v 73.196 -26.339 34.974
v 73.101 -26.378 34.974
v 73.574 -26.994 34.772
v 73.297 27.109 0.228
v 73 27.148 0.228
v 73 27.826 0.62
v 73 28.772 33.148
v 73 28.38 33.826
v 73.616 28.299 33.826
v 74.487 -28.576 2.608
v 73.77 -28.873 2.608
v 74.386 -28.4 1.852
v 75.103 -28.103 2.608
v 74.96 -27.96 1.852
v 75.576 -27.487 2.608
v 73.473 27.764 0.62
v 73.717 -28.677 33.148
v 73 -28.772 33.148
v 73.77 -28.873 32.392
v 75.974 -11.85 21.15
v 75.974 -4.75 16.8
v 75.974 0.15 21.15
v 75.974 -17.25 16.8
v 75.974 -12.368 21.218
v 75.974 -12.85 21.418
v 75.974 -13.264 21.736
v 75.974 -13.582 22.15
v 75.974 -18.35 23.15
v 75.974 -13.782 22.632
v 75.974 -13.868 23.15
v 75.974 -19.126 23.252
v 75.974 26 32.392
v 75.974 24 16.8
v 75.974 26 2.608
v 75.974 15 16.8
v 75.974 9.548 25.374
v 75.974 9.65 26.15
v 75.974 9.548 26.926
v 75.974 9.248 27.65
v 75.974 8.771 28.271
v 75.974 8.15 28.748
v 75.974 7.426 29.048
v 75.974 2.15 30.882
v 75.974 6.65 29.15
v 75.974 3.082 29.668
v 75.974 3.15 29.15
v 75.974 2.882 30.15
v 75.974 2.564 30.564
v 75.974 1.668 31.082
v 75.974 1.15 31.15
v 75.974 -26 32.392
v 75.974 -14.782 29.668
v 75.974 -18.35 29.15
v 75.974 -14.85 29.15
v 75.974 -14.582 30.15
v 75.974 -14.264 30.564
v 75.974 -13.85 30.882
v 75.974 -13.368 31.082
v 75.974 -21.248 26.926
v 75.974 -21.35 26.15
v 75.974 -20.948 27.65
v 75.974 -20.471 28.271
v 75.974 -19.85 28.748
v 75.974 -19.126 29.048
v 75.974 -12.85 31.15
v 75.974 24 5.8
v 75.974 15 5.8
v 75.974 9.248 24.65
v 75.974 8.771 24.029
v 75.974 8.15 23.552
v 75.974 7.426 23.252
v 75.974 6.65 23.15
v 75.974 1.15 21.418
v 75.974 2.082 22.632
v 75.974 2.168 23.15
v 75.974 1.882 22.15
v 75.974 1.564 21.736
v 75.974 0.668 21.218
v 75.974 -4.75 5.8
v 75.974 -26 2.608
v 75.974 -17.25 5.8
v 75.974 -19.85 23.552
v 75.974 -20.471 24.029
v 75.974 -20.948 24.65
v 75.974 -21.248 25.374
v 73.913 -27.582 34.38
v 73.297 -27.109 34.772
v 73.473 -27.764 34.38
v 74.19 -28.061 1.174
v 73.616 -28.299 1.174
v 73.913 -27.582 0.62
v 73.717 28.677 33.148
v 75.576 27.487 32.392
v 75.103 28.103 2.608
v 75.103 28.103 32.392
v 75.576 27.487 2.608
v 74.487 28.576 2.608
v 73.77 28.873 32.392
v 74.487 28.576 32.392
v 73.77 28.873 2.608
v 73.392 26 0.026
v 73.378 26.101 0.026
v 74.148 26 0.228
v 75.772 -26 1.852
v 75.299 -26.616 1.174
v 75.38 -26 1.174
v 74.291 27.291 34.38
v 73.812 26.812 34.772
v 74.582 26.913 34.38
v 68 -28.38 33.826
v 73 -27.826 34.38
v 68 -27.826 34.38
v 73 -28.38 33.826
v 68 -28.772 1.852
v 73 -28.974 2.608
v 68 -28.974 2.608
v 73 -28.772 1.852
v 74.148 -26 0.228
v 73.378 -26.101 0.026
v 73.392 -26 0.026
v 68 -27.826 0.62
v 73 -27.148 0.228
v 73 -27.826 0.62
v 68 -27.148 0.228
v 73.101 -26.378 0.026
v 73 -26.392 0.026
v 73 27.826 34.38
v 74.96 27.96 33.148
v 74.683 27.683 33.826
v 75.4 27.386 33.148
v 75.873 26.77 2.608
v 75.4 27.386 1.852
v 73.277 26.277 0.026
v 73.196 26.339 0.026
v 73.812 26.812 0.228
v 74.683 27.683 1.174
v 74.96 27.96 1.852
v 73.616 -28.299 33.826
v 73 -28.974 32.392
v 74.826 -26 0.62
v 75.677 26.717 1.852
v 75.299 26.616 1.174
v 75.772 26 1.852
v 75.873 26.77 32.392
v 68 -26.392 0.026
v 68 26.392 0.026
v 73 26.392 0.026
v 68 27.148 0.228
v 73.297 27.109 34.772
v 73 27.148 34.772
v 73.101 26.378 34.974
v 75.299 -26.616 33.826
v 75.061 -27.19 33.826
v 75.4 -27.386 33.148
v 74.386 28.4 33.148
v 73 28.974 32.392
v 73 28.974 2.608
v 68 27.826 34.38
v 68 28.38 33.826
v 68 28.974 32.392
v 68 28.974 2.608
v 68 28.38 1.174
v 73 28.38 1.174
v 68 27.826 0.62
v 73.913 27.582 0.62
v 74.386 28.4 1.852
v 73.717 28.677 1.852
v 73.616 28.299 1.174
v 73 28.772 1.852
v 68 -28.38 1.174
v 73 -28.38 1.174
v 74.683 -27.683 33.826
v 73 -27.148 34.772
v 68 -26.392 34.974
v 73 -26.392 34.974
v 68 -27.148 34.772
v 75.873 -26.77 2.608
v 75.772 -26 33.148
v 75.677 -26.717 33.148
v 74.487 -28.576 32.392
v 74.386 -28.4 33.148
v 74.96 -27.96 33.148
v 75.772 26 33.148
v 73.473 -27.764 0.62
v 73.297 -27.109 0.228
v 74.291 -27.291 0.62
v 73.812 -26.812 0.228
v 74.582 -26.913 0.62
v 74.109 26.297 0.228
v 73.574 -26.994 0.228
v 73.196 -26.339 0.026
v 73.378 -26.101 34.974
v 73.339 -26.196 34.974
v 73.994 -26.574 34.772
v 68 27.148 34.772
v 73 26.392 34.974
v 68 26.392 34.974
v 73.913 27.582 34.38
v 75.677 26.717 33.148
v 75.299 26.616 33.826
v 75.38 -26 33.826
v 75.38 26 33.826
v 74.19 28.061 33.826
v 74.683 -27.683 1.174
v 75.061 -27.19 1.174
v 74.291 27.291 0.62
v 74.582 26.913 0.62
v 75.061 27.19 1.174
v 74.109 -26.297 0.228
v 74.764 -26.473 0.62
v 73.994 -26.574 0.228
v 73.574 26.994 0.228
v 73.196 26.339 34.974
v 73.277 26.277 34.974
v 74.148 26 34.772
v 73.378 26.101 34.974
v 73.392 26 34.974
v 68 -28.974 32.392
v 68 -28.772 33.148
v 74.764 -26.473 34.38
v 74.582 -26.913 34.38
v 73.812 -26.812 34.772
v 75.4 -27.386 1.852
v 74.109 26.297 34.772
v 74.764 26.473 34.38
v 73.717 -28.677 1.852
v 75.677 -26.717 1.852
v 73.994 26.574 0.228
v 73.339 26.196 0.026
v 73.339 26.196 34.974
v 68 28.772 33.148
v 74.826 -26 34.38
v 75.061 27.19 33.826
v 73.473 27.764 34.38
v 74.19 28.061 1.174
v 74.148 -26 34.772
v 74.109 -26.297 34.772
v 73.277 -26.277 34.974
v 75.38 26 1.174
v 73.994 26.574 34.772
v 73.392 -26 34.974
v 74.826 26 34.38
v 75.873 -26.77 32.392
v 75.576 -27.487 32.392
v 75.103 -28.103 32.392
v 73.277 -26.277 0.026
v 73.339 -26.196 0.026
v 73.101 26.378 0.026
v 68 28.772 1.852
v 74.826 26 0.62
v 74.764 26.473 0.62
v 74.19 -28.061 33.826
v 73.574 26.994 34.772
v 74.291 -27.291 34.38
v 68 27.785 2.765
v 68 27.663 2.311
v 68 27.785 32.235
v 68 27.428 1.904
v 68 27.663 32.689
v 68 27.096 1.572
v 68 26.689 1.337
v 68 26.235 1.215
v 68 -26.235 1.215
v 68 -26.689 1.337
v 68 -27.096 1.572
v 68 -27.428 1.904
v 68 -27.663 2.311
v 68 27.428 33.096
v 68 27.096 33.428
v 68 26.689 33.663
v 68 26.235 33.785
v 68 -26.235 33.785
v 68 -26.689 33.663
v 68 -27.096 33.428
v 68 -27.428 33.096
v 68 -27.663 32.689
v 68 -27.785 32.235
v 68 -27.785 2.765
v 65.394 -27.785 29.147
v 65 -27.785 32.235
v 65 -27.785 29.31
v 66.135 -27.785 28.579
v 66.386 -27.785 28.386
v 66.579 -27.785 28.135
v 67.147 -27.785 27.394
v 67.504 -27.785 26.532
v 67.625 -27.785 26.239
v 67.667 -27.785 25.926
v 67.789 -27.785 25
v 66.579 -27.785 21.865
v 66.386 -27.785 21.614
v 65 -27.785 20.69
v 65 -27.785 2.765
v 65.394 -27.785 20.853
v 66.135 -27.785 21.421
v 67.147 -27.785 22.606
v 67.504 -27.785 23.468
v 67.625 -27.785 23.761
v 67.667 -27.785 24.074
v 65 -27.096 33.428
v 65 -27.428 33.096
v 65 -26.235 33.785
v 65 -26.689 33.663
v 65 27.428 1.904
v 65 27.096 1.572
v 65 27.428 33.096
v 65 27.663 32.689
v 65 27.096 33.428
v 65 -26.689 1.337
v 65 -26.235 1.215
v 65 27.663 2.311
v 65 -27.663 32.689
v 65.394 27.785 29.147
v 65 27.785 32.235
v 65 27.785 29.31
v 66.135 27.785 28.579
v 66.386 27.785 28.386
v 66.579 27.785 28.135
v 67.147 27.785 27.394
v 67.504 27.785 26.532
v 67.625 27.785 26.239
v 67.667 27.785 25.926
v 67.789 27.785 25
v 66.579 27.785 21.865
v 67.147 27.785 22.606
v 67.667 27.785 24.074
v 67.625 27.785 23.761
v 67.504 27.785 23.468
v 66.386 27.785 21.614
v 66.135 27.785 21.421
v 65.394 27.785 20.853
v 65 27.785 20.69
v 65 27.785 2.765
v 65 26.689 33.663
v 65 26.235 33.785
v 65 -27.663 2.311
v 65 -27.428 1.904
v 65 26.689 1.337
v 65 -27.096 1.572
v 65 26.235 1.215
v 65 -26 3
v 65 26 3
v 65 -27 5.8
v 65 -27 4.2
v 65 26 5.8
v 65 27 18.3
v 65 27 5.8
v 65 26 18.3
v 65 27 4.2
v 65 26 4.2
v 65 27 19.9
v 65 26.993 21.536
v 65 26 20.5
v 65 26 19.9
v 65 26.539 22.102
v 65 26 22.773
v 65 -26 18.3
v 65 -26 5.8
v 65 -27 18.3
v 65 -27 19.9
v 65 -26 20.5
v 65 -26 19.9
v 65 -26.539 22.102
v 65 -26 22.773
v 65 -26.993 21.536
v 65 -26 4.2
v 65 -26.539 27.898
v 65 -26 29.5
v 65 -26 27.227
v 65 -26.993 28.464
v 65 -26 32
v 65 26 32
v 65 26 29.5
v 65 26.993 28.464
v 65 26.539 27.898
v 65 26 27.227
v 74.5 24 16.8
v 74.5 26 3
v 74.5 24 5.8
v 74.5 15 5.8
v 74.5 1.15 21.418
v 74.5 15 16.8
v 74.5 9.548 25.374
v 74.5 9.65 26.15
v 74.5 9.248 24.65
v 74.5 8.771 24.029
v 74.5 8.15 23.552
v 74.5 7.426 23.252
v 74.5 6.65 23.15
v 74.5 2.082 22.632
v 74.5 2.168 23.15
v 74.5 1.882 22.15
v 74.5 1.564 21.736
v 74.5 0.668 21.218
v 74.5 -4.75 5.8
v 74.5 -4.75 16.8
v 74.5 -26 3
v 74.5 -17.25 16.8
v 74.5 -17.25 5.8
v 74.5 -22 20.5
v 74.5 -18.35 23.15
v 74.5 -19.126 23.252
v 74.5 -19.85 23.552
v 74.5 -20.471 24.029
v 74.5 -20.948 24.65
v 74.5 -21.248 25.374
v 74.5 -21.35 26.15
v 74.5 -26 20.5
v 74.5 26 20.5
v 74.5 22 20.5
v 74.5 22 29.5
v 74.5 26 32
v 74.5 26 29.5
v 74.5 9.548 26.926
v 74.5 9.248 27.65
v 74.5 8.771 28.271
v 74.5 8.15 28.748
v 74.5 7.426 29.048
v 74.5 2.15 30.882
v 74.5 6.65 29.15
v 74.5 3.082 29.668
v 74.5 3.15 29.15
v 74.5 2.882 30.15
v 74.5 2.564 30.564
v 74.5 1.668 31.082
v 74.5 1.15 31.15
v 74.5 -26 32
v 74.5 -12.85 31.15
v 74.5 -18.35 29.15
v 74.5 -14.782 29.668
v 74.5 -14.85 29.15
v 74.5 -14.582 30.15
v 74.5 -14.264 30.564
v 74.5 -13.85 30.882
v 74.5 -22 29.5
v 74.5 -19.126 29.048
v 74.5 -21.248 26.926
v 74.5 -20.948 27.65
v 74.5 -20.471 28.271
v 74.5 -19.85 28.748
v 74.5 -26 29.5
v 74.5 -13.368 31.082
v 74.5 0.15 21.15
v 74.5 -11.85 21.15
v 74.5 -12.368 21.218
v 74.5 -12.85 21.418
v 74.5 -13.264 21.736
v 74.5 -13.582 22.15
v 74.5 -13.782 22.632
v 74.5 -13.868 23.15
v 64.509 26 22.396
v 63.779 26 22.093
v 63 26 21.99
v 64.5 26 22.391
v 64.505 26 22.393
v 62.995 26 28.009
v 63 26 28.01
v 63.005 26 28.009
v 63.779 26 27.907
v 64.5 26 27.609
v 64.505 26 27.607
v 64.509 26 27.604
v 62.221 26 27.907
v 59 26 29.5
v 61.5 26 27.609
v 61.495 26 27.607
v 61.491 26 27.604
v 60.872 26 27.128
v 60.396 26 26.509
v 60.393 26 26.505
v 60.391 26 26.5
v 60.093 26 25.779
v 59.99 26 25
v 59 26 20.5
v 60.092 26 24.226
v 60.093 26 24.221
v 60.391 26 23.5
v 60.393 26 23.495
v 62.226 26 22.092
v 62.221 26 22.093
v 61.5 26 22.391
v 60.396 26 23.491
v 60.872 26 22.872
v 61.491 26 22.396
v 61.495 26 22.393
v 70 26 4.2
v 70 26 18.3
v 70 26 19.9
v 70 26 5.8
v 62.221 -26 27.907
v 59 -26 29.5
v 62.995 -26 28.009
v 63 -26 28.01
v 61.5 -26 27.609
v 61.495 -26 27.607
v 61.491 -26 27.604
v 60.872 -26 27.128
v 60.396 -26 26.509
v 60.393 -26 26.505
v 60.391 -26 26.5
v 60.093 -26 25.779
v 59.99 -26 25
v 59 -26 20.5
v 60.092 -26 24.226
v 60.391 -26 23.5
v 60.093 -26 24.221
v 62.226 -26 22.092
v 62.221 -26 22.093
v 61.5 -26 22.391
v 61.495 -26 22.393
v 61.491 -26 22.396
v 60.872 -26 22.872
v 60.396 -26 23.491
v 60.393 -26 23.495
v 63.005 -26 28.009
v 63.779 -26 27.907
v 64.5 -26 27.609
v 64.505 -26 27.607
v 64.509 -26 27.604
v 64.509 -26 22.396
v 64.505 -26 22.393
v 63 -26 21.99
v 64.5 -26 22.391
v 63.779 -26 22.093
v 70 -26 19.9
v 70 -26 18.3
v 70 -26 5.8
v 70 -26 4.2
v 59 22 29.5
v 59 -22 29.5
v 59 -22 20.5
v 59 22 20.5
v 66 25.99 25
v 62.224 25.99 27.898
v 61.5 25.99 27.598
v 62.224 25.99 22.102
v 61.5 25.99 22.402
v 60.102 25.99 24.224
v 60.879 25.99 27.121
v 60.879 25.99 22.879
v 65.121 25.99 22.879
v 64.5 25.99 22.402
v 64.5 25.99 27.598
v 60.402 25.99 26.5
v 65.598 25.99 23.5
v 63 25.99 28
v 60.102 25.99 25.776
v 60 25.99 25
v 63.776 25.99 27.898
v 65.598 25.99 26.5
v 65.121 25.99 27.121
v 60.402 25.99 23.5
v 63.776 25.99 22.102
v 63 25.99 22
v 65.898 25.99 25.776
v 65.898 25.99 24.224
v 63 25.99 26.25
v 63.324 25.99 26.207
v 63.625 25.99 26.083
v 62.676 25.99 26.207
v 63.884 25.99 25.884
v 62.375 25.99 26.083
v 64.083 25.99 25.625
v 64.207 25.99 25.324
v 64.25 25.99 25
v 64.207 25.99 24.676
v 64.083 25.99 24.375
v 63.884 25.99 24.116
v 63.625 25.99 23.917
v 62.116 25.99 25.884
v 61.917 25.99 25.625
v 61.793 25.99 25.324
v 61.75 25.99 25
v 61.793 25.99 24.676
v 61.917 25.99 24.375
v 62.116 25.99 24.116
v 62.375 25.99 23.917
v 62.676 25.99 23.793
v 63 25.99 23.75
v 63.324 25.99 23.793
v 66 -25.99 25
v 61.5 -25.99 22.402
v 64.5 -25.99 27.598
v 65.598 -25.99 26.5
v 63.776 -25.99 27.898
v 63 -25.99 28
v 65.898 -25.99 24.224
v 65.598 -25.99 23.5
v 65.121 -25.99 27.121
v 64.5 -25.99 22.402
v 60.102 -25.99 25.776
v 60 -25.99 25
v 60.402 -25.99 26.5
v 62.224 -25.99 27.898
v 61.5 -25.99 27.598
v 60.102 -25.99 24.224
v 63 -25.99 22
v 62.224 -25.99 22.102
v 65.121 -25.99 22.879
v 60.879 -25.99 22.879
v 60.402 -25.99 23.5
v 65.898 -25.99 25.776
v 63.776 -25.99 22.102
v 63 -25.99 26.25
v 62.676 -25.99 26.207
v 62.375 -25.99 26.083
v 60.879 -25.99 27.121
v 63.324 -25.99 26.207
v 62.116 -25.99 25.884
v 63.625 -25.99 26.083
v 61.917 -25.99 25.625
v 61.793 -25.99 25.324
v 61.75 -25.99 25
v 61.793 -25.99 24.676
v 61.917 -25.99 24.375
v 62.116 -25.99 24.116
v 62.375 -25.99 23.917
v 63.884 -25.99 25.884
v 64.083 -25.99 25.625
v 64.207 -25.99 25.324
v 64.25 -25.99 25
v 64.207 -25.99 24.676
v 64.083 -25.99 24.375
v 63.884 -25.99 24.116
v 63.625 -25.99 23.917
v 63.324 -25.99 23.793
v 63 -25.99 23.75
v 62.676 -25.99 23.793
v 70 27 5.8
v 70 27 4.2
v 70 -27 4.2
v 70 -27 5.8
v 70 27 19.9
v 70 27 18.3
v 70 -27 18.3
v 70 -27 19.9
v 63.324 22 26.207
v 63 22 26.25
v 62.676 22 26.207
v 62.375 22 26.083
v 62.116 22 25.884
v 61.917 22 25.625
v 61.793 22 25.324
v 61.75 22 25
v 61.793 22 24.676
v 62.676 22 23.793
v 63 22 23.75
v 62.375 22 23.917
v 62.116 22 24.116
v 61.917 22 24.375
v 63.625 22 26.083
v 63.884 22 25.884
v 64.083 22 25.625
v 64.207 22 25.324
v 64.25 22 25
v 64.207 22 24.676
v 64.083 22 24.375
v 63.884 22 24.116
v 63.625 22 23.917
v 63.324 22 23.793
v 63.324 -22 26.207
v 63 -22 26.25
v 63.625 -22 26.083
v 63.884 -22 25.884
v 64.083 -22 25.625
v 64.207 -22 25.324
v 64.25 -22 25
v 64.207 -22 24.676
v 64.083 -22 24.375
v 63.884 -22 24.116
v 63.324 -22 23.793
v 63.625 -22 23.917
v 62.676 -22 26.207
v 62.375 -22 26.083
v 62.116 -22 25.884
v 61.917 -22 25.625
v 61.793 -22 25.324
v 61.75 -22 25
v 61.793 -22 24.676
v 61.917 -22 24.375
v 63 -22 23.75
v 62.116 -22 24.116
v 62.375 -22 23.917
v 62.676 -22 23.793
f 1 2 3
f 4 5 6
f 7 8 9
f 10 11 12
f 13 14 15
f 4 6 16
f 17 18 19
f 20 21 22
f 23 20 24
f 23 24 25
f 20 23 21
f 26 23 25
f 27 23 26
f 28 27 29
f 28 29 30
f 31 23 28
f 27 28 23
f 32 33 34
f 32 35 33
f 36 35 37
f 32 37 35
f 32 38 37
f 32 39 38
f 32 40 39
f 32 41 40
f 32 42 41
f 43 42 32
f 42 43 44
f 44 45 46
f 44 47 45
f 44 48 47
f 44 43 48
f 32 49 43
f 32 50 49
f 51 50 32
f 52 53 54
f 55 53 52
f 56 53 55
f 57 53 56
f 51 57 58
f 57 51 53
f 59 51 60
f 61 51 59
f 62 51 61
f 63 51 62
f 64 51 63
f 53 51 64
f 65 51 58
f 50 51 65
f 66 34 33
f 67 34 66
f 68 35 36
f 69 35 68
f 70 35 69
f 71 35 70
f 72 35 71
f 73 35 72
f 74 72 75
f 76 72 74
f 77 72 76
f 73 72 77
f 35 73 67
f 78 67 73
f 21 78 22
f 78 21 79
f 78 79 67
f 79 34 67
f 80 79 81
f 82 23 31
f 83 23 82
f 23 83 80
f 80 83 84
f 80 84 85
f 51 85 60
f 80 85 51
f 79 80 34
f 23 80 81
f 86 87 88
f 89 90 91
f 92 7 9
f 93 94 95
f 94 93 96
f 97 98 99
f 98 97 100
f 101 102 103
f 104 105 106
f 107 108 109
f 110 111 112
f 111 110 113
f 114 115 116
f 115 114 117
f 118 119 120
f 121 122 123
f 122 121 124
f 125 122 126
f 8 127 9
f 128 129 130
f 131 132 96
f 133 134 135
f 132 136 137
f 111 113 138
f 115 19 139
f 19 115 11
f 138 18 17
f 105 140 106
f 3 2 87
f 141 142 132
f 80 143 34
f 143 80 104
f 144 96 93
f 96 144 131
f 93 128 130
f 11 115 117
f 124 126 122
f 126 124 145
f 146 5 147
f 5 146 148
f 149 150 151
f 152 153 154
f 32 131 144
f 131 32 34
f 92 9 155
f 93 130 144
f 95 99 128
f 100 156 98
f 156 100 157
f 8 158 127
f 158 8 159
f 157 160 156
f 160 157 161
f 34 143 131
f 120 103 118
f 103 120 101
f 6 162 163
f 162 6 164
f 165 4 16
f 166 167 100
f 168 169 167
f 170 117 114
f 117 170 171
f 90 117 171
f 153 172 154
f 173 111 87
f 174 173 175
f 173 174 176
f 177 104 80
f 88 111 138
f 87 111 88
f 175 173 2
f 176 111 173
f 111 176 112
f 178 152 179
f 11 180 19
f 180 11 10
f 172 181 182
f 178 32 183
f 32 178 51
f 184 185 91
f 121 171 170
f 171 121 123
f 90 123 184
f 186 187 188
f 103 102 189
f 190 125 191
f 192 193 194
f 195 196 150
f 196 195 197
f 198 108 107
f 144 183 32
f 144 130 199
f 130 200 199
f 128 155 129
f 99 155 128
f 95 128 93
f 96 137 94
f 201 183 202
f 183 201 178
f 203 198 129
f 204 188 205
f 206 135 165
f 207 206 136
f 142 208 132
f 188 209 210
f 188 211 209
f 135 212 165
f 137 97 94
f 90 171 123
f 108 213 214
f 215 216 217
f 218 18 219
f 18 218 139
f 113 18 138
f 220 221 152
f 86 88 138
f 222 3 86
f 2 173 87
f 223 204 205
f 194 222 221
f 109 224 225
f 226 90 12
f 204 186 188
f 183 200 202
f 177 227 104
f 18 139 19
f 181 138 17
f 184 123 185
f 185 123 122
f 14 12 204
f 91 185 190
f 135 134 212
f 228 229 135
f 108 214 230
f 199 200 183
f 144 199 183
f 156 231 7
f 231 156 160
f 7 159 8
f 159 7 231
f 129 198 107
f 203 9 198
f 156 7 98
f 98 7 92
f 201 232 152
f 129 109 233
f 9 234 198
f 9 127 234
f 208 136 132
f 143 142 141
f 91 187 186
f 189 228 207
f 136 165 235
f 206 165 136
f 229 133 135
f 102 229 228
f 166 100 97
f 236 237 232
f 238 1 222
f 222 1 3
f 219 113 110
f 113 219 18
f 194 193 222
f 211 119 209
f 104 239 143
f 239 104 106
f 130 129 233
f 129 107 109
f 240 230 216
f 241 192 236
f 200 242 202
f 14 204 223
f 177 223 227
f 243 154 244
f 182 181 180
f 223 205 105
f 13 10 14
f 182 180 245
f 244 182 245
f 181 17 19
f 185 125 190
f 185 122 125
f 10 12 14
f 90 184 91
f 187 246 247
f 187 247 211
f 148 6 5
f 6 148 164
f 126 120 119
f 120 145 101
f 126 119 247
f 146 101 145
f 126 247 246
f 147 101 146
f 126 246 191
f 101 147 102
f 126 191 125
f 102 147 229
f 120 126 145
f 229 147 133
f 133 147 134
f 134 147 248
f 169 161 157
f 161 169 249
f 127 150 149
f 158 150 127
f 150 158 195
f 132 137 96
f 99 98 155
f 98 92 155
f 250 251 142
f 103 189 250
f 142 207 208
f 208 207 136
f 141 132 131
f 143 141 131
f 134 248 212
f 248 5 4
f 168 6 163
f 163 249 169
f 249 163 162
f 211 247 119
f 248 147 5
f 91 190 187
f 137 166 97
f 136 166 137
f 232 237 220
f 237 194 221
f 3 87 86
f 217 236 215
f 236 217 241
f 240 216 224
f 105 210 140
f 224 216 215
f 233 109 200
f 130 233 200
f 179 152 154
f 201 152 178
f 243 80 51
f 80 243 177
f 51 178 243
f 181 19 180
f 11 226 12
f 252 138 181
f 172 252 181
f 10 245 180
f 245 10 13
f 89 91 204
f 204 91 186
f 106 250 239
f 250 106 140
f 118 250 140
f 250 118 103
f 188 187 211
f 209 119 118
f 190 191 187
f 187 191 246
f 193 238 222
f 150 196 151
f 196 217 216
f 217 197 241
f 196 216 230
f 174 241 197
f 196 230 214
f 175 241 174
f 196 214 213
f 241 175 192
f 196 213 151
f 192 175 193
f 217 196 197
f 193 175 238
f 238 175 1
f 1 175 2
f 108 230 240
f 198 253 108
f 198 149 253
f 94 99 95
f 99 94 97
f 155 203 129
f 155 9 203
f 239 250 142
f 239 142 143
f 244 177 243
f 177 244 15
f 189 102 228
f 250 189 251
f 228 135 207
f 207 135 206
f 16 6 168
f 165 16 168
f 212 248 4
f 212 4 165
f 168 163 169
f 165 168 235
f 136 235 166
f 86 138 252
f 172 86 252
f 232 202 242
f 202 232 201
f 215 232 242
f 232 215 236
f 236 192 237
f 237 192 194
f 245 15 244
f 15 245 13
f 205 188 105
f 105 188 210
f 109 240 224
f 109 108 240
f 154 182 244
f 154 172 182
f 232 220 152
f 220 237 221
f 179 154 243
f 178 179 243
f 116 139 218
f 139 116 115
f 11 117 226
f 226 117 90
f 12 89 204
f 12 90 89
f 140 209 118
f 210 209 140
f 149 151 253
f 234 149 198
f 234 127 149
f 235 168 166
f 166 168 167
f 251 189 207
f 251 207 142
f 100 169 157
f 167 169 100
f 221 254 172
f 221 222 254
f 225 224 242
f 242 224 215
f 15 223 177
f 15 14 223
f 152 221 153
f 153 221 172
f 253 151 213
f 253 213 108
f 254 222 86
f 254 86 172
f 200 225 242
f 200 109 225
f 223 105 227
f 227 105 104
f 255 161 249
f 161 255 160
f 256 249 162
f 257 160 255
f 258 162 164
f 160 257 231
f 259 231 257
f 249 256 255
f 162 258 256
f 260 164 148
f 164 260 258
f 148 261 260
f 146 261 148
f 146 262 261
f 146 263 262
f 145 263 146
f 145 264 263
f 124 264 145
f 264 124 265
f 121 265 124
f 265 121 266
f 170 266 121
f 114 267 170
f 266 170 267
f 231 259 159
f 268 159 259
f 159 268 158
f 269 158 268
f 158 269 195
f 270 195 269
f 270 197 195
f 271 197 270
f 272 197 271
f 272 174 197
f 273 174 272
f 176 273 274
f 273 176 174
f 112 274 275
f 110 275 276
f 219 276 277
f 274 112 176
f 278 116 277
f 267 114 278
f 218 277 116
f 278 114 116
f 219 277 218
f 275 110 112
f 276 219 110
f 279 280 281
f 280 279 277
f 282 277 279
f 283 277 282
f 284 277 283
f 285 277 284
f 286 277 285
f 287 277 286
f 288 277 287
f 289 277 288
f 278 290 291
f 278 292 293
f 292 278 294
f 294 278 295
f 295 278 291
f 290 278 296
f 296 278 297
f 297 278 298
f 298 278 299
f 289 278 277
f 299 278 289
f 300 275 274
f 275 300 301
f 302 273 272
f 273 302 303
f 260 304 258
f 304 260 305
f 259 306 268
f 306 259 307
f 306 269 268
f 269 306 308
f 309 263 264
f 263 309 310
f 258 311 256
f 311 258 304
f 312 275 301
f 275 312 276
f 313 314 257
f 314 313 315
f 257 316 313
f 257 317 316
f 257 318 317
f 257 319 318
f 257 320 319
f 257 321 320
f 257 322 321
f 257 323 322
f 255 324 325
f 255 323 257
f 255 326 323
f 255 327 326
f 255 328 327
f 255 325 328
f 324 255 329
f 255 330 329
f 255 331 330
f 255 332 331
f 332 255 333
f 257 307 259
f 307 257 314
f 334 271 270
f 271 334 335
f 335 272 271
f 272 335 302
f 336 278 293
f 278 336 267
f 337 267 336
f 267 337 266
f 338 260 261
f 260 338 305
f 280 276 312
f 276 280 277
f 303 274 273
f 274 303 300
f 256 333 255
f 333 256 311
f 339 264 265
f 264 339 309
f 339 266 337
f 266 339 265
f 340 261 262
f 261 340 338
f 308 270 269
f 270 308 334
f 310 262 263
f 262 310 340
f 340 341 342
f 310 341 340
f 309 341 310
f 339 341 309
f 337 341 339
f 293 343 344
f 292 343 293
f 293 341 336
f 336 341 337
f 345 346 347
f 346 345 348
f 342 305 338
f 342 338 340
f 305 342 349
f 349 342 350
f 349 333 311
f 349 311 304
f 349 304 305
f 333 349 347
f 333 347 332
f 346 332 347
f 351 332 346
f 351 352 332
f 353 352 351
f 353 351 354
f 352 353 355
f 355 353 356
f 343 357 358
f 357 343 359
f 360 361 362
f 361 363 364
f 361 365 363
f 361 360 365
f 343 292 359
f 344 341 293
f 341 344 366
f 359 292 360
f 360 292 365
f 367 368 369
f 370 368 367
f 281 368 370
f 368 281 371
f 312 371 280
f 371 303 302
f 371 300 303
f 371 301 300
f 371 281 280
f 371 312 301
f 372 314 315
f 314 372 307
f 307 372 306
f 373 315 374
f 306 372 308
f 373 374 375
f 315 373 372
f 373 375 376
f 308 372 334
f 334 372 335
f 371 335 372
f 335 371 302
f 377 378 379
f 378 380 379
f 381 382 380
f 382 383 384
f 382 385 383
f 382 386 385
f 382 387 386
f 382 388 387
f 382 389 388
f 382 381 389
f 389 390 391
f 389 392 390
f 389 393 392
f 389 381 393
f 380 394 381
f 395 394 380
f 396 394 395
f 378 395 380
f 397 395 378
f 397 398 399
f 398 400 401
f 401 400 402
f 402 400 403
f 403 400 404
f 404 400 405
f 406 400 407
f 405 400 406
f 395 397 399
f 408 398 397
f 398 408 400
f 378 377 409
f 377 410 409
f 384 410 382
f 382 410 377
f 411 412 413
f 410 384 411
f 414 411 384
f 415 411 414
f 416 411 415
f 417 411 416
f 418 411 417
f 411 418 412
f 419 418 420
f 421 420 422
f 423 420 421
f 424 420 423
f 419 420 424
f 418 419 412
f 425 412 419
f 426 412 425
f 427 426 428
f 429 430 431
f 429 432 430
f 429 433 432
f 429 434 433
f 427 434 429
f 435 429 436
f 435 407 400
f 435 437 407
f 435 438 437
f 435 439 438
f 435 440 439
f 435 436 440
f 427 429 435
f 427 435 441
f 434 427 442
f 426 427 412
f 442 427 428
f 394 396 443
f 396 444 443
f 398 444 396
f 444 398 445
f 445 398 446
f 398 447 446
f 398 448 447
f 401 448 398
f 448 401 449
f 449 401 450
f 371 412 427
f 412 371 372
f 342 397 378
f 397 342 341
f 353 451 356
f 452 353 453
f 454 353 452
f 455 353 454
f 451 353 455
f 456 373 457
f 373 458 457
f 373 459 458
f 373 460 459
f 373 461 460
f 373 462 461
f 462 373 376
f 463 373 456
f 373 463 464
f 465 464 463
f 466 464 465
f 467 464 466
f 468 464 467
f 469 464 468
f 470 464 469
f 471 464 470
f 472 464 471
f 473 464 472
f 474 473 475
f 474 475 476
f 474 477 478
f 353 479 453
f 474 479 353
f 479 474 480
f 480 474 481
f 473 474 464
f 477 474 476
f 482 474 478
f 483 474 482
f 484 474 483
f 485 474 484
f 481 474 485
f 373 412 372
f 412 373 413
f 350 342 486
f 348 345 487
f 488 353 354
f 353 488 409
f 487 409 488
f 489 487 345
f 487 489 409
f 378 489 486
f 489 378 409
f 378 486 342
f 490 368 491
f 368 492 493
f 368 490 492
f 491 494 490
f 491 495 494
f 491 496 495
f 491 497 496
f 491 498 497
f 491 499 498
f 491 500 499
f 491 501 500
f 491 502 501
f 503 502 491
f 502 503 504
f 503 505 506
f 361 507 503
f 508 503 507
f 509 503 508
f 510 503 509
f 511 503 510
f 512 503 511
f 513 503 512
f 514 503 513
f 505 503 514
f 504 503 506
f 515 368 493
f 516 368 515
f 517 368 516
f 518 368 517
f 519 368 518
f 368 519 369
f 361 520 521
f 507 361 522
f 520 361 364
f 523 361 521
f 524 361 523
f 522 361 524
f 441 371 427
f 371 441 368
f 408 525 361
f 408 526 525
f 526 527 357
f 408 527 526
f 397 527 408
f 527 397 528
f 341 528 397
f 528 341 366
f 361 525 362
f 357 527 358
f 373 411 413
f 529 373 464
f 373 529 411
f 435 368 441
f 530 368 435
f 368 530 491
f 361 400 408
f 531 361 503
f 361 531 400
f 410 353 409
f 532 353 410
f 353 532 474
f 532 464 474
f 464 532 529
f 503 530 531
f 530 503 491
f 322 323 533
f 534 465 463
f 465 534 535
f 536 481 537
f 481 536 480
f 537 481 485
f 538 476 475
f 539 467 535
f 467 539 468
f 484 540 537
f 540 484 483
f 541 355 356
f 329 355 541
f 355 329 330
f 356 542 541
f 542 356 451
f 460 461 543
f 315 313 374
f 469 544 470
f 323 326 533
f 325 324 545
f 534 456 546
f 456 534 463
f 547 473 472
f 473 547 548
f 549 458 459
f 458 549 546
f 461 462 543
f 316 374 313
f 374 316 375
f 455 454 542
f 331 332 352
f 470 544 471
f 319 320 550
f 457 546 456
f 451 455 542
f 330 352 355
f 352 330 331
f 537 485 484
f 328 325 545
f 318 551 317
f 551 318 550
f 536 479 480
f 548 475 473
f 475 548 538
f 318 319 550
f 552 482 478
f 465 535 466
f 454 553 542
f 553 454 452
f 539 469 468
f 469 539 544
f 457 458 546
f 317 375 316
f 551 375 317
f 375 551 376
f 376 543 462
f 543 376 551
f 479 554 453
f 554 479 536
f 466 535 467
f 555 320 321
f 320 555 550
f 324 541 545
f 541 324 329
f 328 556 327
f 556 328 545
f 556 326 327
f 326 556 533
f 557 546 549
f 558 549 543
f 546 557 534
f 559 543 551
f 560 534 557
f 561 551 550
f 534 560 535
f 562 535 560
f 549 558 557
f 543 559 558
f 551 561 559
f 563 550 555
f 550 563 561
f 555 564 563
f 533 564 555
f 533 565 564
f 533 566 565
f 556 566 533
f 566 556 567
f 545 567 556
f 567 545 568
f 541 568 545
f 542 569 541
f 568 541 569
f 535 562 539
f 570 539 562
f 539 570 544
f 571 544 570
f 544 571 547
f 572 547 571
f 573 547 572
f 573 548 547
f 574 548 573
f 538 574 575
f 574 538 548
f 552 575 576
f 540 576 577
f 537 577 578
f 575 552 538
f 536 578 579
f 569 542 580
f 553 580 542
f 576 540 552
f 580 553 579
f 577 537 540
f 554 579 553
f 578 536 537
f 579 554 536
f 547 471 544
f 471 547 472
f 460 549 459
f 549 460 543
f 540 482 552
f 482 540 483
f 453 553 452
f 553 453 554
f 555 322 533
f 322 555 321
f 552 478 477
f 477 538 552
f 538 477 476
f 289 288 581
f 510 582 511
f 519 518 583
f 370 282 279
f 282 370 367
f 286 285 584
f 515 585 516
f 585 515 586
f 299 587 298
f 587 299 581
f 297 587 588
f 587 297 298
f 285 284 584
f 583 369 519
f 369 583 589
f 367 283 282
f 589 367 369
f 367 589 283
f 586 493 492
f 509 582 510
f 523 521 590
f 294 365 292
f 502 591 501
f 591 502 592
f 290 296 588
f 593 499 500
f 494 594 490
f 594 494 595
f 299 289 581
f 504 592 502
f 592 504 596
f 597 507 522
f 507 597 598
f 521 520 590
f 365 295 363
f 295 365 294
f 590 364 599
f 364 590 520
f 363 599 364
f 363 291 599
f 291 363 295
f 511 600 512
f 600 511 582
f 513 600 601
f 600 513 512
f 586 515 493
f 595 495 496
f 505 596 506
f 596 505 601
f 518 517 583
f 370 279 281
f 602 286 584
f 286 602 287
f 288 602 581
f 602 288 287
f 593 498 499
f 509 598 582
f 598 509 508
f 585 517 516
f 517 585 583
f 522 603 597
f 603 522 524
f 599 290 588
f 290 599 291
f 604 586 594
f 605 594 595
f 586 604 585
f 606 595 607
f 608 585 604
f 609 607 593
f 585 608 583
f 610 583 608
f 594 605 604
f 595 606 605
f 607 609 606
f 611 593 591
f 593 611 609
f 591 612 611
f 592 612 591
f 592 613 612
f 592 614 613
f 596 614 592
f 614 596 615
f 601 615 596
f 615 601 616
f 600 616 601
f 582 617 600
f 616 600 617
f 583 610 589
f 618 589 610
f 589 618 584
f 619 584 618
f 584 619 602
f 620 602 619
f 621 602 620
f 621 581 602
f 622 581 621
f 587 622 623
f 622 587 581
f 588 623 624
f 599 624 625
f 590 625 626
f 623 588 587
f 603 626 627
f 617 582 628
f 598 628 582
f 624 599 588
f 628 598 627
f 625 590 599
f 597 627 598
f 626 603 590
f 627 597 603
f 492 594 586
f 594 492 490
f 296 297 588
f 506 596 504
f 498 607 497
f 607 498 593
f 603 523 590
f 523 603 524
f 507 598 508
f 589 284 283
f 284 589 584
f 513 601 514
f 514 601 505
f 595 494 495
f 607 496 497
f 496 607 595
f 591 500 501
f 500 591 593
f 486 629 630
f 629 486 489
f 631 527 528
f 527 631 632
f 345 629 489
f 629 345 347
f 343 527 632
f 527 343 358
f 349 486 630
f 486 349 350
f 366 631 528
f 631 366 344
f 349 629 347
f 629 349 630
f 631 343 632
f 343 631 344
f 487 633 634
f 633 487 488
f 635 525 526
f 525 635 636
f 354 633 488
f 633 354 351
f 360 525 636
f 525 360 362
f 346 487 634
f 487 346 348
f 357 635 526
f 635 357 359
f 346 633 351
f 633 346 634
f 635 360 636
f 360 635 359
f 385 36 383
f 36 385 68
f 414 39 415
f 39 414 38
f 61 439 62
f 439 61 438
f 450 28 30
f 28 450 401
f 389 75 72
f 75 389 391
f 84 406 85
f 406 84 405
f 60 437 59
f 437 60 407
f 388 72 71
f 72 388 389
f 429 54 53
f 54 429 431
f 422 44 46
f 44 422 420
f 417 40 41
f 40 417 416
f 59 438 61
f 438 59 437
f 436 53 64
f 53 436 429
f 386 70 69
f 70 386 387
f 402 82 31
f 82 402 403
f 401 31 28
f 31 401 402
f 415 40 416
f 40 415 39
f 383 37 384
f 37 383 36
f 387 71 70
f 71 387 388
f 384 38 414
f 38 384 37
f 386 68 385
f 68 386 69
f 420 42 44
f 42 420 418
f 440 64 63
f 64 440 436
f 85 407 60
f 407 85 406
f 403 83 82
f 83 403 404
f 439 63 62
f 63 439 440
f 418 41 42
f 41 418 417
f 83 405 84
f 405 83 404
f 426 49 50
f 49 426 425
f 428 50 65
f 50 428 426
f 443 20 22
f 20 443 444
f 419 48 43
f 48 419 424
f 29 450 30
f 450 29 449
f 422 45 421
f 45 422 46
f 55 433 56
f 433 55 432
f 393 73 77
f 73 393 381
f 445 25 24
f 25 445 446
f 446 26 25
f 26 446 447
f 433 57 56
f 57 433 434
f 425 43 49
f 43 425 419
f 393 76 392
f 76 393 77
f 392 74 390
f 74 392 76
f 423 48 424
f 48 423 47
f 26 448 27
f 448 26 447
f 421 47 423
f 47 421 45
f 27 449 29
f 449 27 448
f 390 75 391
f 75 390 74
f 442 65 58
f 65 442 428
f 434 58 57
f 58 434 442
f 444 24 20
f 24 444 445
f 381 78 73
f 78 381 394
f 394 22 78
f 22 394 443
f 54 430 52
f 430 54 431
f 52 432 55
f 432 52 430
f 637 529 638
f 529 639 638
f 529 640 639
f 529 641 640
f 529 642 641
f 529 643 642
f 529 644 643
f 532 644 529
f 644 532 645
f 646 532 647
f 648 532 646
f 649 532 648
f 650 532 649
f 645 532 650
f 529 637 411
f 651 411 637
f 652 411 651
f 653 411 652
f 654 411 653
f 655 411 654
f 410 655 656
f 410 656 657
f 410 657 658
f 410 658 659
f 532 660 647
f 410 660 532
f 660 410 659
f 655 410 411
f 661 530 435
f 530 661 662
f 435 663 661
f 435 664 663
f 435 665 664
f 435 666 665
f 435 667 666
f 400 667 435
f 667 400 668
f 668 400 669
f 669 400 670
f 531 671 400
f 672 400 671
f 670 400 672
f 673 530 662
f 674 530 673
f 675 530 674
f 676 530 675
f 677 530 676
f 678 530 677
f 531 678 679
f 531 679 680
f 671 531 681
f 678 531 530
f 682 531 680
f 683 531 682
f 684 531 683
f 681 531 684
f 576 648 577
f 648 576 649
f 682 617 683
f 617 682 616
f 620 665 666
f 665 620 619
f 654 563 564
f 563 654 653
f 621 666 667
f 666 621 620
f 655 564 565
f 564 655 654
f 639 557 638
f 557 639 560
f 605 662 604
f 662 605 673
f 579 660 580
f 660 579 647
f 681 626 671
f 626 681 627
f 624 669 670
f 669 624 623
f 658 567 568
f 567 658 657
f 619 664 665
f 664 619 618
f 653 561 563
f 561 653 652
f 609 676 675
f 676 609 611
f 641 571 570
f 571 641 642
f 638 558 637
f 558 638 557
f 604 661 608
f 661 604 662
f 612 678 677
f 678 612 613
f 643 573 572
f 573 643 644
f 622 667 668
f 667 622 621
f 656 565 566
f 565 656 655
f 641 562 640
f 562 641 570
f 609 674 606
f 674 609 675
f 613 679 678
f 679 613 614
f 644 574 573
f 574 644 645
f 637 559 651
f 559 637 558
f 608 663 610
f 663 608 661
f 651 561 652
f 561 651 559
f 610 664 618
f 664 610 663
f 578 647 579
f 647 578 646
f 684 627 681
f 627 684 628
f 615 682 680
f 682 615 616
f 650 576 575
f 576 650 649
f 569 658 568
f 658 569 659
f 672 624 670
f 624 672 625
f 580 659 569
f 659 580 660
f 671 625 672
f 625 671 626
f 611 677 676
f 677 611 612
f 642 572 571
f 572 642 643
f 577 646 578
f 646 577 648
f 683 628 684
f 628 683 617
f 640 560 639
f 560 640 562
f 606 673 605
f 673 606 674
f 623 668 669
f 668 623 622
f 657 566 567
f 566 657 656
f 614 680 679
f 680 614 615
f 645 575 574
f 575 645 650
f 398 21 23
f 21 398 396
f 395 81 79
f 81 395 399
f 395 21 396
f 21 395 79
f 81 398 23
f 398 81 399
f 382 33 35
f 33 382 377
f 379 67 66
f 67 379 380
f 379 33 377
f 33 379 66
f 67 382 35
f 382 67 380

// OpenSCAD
FFF=[false,false,false];FFT=[false,false,true];
FTF=[false,true,false];FTT=[false,true,true];
TFF=[true,false,false];TFT=[true,false,true];
TTF=[true,true,false];TTT=[true,true,true];
module cube2(size, center) {
  translate([
    center[0] ? -size[0]/2 : 0,
    center[1] ? -size[1]/2 : 0,
    center[2] ? -size[2]/2 : 0]) cube(size);
}
module mirror_x() {
  for(a=[0,1])mirror([a,0,0])children();
}
module mirror_y() {
  for(a=[0,1])mirror([0,a,0])children();
}
module mirror_z() {
  for(a=[0,1])mirror([0,0,a])children();
}


outer_dimensions=[76,58,35];
corner_r=3;
pcb_distance=12.5+1.6;
screw_height=25;
module shell_form(r=corner_r) {
  minkowski() {
    translate([corner_r,0,corner_r])
      cube2([outer_dimensions[0]-2*corner_r,outer_dimensions[1]-2*corner_r,outer_dimensions[2]-2*corner_r],FTF);
    sphere(r=r,$fn=24);
  }
}
module shell() {
  difference() {
    shell_form(corner_r);
    shell_form(1.8);
  }
}

module screw_towers() {
  mirror_y()translate([63,58/2,screw_height])rotate([90,0,0])cylinder(d1=12,d2=6,h=3.01,$fn=24);
}
module case() {
  difference() {
    union() {
      shell();
      for(a=[0,pcb_distance])translate([0,0,5+a]) {
        translate([5,0]) cube2([60,57,6],FTT);
        translate([1,0]) cube2([2,50,6],FTT);
      }
      screw_towers();
      //translate([60,23,21])cube2([10,10,13]);
    }
    //translate([2+46,19,22])cube2([11,100,100]);
    for(a=[0,pcb_distance])translate([0,0,5+a]) {
      translate([4,0]) {
        cube2([70,54,1.6],FTT);
        cube2([70,52,7],FTT);
      }
      translate([2,0]) cube2([2,52,1.6],FTT);
    }
    mirror_y() {
      translate([63,0,screw_height])rotate([90,0,0])cylinder(d=3.2,h=100,center=true,$fn=24);
      translate([63,58/2+0.1,screw_height])rotate([90,0,0])cylinder(d1=6,d2=0,h=3.01,$fn=24);
    }
    translate([68,0])cube2([200,200,200],FTT);
  }
}

module front() {
  difference() {
    union() {
      difference() {
        union() {
          intersection() {
            shell_form(corner_r);
            translate([68,0])cube2([200,200,200],FTT);
          }
          intersection() {
            shell_form(1.8);
            translate([65,0])cube2([200,200,200],FTT);
          }
        }
        translate([1.5,0])shell_form(0);
      }
      translate([59,0,screw_height]) cube2([16,52,9],FTT);
    }
    translate([58.5,0,screw_height]) cube2([16,44,10],FTT);
    difference() {
      screw_towers();
      translate([68,0])cube2([200,200,200],FTT);
    }
    translate([63,0,screw_height])rotate([90,0,0])cylinder(d=2.5,h=100,center=true,$fn=24);
    
    for(a=[0,pcb_distance])translate([0,0,5+a])
        cube2([70,54,1.6],FTT);
    
    translate([70,-11,5.8 ])cube2([20,12.5,11],TTF);
    translate([70,19.5,5.8 ])cube2([20,9,11],TTF);
    translate([70,-58/2+2+0.35+20.8,5.8+pcb_distance+6.25]) {
      hull()mirror_y() {
        translate([0,12.5])rotate([0,90])cylinder(d=6,h=20,$fn=24,center=true);
      }
      hull()mirror_y() {
        translate([0,6,-3])rotate([0,90])cylinder(d=4,h=20,$fn=24,center=true);
        translate([0,7,3])rotate([0,90])cylinder(d=4,h=20,$fn=24,center=true);
      }
      
    }
    //2+0.35+8.3
    //2+0.35+8.3+25
  }
}


//case();
front();
